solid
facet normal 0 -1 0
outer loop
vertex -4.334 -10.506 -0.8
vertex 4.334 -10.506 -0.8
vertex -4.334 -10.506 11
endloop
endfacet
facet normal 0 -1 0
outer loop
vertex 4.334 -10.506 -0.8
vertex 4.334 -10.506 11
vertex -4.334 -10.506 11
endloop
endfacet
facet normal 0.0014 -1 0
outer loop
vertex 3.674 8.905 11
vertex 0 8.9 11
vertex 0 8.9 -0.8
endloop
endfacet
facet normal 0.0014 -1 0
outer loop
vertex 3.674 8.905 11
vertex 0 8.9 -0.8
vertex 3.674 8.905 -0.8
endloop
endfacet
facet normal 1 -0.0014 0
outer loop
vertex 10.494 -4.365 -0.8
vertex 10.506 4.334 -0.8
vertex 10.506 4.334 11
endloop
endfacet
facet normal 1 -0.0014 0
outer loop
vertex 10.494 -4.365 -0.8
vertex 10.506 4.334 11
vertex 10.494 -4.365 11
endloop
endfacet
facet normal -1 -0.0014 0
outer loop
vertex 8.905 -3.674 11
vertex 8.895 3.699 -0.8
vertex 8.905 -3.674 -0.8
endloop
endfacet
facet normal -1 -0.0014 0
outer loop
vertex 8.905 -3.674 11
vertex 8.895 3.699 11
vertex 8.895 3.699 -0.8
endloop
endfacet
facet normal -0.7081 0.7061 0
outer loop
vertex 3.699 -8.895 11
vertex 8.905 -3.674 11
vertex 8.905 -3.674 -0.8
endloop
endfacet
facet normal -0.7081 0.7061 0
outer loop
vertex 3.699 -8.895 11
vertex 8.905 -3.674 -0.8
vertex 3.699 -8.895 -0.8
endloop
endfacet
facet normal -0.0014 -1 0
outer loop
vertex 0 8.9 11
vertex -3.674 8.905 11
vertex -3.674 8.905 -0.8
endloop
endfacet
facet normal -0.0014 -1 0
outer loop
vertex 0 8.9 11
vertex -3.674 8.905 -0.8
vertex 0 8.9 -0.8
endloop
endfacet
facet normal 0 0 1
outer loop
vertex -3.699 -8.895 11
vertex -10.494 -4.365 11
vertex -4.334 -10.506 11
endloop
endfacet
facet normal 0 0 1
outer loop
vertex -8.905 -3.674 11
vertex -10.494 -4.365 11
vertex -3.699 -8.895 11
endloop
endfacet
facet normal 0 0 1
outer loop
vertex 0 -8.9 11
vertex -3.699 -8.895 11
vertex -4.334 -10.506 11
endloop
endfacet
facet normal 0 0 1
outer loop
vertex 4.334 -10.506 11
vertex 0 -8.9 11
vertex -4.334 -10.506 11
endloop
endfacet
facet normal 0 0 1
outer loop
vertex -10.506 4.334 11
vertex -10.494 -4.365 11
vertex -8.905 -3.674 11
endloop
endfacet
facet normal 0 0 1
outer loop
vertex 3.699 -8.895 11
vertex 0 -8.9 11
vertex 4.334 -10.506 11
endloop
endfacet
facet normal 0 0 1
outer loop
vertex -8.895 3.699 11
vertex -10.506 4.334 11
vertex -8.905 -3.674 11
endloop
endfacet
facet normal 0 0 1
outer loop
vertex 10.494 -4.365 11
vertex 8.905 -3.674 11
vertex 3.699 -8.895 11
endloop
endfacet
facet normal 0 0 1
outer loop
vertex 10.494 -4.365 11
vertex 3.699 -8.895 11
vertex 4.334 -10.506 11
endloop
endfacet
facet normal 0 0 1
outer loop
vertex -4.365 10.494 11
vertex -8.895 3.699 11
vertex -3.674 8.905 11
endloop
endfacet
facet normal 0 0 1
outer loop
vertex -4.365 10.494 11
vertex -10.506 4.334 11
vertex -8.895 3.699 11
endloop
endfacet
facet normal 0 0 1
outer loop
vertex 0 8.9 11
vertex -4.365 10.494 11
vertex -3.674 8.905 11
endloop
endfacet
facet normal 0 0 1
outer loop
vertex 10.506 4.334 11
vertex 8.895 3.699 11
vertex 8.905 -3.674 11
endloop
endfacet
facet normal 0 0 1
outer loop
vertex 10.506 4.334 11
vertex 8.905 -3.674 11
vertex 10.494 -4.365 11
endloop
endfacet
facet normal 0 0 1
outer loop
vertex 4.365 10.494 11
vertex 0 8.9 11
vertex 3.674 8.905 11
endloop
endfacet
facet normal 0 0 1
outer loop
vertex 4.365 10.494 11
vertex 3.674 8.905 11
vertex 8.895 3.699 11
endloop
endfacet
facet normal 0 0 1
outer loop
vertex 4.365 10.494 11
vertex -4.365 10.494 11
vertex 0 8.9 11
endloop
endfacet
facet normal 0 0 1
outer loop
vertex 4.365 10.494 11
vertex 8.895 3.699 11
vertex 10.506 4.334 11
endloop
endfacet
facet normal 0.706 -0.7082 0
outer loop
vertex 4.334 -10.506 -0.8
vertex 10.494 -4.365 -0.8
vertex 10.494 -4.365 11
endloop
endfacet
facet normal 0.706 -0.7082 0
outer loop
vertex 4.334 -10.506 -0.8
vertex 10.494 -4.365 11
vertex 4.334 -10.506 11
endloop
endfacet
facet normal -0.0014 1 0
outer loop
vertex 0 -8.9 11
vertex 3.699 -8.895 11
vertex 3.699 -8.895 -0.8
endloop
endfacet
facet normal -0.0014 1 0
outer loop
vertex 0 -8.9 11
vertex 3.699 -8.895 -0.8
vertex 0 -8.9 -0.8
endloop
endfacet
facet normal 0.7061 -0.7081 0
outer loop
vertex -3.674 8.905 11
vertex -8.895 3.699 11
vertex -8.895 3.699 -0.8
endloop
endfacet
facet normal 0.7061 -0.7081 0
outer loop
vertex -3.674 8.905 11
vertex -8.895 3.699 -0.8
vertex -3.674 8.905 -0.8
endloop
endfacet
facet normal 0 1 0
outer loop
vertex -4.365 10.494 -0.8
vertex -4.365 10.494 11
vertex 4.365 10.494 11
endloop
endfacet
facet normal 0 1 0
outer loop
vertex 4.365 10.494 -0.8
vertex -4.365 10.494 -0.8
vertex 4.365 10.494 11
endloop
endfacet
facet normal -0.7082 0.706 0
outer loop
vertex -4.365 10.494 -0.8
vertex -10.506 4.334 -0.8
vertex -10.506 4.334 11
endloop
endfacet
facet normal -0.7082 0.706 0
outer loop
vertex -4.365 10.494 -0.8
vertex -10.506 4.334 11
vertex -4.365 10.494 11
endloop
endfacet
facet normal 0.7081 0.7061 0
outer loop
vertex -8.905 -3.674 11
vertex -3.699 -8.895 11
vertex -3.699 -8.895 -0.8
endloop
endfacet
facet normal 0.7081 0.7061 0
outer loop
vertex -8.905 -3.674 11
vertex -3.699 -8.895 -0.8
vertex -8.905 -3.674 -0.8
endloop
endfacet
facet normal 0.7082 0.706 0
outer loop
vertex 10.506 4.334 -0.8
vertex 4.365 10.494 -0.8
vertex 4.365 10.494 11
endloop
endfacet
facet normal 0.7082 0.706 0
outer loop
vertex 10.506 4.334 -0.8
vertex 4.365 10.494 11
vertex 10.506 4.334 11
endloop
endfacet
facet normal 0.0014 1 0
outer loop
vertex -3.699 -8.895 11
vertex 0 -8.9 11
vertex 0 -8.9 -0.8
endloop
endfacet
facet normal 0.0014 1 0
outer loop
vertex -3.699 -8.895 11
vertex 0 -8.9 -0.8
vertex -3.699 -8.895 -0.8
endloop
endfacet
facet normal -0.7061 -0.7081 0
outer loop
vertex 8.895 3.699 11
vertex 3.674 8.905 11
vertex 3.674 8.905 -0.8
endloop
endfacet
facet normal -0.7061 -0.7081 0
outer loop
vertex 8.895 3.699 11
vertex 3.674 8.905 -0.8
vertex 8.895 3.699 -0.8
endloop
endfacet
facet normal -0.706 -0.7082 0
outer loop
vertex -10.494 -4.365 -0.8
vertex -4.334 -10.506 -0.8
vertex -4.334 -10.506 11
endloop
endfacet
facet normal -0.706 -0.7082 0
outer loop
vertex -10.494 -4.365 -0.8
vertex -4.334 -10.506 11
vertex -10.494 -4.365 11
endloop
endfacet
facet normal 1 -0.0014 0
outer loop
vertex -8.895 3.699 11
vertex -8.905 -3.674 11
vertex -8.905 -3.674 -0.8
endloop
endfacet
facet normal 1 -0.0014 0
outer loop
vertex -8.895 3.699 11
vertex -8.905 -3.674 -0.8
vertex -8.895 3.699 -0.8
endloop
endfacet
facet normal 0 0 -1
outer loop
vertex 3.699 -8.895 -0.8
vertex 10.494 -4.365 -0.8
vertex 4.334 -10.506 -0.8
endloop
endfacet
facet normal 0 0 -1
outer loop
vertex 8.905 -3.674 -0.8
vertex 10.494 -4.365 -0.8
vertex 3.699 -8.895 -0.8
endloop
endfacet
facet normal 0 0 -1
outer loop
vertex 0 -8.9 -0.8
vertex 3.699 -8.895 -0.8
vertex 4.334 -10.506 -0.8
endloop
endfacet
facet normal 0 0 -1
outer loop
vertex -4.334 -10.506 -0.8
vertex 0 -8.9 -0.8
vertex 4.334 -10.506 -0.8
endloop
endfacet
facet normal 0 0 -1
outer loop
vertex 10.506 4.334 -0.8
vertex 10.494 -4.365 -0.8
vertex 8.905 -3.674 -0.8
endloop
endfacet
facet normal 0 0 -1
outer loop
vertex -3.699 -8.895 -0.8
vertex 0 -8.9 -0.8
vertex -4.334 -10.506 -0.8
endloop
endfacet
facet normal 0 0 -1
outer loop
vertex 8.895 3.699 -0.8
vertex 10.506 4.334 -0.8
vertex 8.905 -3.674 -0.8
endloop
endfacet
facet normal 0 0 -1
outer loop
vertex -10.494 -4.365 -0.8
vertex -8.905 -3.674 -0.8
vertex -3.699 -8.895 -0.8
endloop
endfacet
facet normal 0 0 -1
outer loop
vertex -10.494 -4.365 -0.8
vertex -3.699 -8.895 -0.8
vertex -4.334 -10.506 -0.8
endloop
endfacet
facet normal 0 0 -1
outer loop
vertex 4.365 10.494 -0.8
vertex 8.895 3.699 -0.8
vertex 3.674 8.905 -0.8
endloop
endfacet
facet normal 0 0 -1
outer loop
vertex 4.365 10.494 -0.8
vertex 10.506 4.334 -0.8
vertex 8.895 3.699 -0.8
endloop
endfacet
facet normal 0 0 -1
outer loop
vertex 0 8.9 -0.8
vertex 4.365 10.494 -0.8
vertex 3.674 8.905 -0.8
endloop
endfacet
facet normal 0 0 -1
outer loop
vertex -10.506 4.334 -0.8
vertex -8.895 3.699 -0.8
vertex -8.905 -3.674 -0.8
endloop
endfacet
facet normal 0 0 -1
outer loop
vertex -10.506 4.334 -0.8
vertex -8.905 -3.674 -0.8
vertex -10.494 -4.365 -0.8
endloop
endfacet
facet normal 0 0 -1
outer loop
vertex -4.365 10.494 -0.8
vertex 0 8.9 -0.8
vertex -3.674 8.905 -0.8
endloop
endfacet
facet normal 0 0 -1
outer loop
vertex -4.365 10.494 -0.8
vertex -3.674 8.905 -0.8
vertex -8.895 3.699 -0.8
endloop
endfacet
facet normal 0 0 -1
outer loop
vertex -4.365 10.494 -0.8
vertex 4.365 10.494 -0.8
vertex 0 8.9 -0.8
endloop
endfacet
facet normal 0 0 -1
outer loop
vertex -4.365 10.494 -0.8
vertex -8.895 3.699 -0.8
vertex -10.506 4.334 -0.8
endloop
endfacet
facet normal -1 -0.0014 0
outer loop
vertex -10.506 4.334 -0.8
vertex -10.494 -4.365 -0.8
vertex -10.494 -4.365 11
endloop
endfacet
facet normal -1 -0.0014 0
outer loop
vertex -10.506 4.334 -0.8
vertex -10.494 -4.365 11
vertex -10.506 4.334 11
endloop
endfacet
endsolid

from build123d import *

# Parameters (mm, degrees)
BOSS_EXTRUDE1_DEPTH = 9.8
SKETCH2_R           = 3.949999995
BOSS_EXTRUDE2_DEPTH = 1.2
SKETCH3_W           = 38.864651583
SKETCH3_H           = 1.2
CUT_EXTRUDE1_DEPTH  = 21.999977365
BOSS_EXTRUDE3_DEPTH = 2


with BuildPart() as part:
    # Sketch1 → Boss-Extrude1 (new body)
    with BuildSketch(Plane.XY.offset(11)):
        Polygon((4.333958961, -10.506317019), (10.493660346, -4.364516586), (10.506317019, 4.333958961), (4.364516586, 10.493660346), (-4.364516586, 10.493660346), (-10.506317019, 4.333958961), (-10.493660346, -4.364516586), (-4.333958961, -10.506317019), align=None)
        Polygon((0, 8.900009778), (3.673546249, 8.905354887), (8.894626983, 3.699447494), (8.905354887, -3.673546249), (3.699447494, -8.894626983), (0, -8.900009778), (-3.699447494, -8.894626983), (-8.905354887, -3.673546249), (-8.894626983, 3.699447494), (-3.673546249, 8.905354887), align=None, mode=Mode.SUBTRACT)
    extrude(amount=-BOSS_EXTRUDE1_DEPTH)

    # Sketch2 → Boss-Extrude2 (add)
    with BuildSketch(Plane(origin=(0, 0, 1.2), x_dir=(-1, 0, 0), z_dir=(0, 0, -1))):
        with BuildLine():
            Line((4.364516586, 10.493660346), (-4.364516586, 10.493660346))
            Line((-4.364516586, 10.493660346), (-10.506317019, 4.333958961))
            ThreePointArc((-10.506317019, 4.333958961), (-14.560364187, -0.021186842), (-10.493660346, -4.364516586))
            Line((-10.493660346, -4.364516586), (-4.333958961, -10.506317019))
            Line((-4.333958961, -10.506317019), (4.333958961, -10.506317019))
            Line((4.333958961, -10.506317019), (10.493660346, -4.364516586))
            ThreePointArc((10.493660346, -4.364516586), (14.560364187, -0.021186842), (10.506317019, 4.333958961))
            Line((10.506317019, 4.333958961), (4.364516586, 10.493660346))
        make_face()
        Circle(SKETCH2_R, mode=Mode.SUBTRACT)
    extrude(amount=BOSS_EXTRUDE2_DEPTH)

    # Sketch3 → Cut-Extrude1 (cut, through all)
    with BuildSketch(Plane.XZ.offset(10.506317019)):
        with Locations((0.864726488, 0.6)):
            Rectangle(SKETCH3_W, SKETCH3_H)
    extrude(amount=-CUT_EXTRUDE1_DEPTH, mode=Mode.SUBTRACT)

    # Sketch5 → Boss-Extrude3 (add)
    with BuildSketch(Plane(origin=(0, 0, 1.2), x_dir=(-1, 0, 0), z_dir=(0, 0, -1))):
        Polygon((-4.364516586, 10.493660346), (-10.506317019, 4.333958961), (-10.493660346, -4.364516586), (-4.333958961, -10.506317019), (4.333958961, -10.506317019), (10.493660346, -4.364516586), (10.506317019, 4.333958961), (4.364516586, 10.493660346), align=None)
        Polygon((-8.894626983, 3.699447494), (-8.905354887, -3.673546249), (-3.699447494, -8.894626983), (0, -8.900009778), (3.699447494, -8.894626983), (8.905354887, -3.673546249), (8.894626983, 3.699447494), (3.673546249, 8.905354887), (0, 8.900009778), (-3.673546249, 8.905354887), align=None, mode=Mode.SUBTRACT)
    extrude(amount=BOSS_EXTRUDE3_DEPTH)


solid = part.part
